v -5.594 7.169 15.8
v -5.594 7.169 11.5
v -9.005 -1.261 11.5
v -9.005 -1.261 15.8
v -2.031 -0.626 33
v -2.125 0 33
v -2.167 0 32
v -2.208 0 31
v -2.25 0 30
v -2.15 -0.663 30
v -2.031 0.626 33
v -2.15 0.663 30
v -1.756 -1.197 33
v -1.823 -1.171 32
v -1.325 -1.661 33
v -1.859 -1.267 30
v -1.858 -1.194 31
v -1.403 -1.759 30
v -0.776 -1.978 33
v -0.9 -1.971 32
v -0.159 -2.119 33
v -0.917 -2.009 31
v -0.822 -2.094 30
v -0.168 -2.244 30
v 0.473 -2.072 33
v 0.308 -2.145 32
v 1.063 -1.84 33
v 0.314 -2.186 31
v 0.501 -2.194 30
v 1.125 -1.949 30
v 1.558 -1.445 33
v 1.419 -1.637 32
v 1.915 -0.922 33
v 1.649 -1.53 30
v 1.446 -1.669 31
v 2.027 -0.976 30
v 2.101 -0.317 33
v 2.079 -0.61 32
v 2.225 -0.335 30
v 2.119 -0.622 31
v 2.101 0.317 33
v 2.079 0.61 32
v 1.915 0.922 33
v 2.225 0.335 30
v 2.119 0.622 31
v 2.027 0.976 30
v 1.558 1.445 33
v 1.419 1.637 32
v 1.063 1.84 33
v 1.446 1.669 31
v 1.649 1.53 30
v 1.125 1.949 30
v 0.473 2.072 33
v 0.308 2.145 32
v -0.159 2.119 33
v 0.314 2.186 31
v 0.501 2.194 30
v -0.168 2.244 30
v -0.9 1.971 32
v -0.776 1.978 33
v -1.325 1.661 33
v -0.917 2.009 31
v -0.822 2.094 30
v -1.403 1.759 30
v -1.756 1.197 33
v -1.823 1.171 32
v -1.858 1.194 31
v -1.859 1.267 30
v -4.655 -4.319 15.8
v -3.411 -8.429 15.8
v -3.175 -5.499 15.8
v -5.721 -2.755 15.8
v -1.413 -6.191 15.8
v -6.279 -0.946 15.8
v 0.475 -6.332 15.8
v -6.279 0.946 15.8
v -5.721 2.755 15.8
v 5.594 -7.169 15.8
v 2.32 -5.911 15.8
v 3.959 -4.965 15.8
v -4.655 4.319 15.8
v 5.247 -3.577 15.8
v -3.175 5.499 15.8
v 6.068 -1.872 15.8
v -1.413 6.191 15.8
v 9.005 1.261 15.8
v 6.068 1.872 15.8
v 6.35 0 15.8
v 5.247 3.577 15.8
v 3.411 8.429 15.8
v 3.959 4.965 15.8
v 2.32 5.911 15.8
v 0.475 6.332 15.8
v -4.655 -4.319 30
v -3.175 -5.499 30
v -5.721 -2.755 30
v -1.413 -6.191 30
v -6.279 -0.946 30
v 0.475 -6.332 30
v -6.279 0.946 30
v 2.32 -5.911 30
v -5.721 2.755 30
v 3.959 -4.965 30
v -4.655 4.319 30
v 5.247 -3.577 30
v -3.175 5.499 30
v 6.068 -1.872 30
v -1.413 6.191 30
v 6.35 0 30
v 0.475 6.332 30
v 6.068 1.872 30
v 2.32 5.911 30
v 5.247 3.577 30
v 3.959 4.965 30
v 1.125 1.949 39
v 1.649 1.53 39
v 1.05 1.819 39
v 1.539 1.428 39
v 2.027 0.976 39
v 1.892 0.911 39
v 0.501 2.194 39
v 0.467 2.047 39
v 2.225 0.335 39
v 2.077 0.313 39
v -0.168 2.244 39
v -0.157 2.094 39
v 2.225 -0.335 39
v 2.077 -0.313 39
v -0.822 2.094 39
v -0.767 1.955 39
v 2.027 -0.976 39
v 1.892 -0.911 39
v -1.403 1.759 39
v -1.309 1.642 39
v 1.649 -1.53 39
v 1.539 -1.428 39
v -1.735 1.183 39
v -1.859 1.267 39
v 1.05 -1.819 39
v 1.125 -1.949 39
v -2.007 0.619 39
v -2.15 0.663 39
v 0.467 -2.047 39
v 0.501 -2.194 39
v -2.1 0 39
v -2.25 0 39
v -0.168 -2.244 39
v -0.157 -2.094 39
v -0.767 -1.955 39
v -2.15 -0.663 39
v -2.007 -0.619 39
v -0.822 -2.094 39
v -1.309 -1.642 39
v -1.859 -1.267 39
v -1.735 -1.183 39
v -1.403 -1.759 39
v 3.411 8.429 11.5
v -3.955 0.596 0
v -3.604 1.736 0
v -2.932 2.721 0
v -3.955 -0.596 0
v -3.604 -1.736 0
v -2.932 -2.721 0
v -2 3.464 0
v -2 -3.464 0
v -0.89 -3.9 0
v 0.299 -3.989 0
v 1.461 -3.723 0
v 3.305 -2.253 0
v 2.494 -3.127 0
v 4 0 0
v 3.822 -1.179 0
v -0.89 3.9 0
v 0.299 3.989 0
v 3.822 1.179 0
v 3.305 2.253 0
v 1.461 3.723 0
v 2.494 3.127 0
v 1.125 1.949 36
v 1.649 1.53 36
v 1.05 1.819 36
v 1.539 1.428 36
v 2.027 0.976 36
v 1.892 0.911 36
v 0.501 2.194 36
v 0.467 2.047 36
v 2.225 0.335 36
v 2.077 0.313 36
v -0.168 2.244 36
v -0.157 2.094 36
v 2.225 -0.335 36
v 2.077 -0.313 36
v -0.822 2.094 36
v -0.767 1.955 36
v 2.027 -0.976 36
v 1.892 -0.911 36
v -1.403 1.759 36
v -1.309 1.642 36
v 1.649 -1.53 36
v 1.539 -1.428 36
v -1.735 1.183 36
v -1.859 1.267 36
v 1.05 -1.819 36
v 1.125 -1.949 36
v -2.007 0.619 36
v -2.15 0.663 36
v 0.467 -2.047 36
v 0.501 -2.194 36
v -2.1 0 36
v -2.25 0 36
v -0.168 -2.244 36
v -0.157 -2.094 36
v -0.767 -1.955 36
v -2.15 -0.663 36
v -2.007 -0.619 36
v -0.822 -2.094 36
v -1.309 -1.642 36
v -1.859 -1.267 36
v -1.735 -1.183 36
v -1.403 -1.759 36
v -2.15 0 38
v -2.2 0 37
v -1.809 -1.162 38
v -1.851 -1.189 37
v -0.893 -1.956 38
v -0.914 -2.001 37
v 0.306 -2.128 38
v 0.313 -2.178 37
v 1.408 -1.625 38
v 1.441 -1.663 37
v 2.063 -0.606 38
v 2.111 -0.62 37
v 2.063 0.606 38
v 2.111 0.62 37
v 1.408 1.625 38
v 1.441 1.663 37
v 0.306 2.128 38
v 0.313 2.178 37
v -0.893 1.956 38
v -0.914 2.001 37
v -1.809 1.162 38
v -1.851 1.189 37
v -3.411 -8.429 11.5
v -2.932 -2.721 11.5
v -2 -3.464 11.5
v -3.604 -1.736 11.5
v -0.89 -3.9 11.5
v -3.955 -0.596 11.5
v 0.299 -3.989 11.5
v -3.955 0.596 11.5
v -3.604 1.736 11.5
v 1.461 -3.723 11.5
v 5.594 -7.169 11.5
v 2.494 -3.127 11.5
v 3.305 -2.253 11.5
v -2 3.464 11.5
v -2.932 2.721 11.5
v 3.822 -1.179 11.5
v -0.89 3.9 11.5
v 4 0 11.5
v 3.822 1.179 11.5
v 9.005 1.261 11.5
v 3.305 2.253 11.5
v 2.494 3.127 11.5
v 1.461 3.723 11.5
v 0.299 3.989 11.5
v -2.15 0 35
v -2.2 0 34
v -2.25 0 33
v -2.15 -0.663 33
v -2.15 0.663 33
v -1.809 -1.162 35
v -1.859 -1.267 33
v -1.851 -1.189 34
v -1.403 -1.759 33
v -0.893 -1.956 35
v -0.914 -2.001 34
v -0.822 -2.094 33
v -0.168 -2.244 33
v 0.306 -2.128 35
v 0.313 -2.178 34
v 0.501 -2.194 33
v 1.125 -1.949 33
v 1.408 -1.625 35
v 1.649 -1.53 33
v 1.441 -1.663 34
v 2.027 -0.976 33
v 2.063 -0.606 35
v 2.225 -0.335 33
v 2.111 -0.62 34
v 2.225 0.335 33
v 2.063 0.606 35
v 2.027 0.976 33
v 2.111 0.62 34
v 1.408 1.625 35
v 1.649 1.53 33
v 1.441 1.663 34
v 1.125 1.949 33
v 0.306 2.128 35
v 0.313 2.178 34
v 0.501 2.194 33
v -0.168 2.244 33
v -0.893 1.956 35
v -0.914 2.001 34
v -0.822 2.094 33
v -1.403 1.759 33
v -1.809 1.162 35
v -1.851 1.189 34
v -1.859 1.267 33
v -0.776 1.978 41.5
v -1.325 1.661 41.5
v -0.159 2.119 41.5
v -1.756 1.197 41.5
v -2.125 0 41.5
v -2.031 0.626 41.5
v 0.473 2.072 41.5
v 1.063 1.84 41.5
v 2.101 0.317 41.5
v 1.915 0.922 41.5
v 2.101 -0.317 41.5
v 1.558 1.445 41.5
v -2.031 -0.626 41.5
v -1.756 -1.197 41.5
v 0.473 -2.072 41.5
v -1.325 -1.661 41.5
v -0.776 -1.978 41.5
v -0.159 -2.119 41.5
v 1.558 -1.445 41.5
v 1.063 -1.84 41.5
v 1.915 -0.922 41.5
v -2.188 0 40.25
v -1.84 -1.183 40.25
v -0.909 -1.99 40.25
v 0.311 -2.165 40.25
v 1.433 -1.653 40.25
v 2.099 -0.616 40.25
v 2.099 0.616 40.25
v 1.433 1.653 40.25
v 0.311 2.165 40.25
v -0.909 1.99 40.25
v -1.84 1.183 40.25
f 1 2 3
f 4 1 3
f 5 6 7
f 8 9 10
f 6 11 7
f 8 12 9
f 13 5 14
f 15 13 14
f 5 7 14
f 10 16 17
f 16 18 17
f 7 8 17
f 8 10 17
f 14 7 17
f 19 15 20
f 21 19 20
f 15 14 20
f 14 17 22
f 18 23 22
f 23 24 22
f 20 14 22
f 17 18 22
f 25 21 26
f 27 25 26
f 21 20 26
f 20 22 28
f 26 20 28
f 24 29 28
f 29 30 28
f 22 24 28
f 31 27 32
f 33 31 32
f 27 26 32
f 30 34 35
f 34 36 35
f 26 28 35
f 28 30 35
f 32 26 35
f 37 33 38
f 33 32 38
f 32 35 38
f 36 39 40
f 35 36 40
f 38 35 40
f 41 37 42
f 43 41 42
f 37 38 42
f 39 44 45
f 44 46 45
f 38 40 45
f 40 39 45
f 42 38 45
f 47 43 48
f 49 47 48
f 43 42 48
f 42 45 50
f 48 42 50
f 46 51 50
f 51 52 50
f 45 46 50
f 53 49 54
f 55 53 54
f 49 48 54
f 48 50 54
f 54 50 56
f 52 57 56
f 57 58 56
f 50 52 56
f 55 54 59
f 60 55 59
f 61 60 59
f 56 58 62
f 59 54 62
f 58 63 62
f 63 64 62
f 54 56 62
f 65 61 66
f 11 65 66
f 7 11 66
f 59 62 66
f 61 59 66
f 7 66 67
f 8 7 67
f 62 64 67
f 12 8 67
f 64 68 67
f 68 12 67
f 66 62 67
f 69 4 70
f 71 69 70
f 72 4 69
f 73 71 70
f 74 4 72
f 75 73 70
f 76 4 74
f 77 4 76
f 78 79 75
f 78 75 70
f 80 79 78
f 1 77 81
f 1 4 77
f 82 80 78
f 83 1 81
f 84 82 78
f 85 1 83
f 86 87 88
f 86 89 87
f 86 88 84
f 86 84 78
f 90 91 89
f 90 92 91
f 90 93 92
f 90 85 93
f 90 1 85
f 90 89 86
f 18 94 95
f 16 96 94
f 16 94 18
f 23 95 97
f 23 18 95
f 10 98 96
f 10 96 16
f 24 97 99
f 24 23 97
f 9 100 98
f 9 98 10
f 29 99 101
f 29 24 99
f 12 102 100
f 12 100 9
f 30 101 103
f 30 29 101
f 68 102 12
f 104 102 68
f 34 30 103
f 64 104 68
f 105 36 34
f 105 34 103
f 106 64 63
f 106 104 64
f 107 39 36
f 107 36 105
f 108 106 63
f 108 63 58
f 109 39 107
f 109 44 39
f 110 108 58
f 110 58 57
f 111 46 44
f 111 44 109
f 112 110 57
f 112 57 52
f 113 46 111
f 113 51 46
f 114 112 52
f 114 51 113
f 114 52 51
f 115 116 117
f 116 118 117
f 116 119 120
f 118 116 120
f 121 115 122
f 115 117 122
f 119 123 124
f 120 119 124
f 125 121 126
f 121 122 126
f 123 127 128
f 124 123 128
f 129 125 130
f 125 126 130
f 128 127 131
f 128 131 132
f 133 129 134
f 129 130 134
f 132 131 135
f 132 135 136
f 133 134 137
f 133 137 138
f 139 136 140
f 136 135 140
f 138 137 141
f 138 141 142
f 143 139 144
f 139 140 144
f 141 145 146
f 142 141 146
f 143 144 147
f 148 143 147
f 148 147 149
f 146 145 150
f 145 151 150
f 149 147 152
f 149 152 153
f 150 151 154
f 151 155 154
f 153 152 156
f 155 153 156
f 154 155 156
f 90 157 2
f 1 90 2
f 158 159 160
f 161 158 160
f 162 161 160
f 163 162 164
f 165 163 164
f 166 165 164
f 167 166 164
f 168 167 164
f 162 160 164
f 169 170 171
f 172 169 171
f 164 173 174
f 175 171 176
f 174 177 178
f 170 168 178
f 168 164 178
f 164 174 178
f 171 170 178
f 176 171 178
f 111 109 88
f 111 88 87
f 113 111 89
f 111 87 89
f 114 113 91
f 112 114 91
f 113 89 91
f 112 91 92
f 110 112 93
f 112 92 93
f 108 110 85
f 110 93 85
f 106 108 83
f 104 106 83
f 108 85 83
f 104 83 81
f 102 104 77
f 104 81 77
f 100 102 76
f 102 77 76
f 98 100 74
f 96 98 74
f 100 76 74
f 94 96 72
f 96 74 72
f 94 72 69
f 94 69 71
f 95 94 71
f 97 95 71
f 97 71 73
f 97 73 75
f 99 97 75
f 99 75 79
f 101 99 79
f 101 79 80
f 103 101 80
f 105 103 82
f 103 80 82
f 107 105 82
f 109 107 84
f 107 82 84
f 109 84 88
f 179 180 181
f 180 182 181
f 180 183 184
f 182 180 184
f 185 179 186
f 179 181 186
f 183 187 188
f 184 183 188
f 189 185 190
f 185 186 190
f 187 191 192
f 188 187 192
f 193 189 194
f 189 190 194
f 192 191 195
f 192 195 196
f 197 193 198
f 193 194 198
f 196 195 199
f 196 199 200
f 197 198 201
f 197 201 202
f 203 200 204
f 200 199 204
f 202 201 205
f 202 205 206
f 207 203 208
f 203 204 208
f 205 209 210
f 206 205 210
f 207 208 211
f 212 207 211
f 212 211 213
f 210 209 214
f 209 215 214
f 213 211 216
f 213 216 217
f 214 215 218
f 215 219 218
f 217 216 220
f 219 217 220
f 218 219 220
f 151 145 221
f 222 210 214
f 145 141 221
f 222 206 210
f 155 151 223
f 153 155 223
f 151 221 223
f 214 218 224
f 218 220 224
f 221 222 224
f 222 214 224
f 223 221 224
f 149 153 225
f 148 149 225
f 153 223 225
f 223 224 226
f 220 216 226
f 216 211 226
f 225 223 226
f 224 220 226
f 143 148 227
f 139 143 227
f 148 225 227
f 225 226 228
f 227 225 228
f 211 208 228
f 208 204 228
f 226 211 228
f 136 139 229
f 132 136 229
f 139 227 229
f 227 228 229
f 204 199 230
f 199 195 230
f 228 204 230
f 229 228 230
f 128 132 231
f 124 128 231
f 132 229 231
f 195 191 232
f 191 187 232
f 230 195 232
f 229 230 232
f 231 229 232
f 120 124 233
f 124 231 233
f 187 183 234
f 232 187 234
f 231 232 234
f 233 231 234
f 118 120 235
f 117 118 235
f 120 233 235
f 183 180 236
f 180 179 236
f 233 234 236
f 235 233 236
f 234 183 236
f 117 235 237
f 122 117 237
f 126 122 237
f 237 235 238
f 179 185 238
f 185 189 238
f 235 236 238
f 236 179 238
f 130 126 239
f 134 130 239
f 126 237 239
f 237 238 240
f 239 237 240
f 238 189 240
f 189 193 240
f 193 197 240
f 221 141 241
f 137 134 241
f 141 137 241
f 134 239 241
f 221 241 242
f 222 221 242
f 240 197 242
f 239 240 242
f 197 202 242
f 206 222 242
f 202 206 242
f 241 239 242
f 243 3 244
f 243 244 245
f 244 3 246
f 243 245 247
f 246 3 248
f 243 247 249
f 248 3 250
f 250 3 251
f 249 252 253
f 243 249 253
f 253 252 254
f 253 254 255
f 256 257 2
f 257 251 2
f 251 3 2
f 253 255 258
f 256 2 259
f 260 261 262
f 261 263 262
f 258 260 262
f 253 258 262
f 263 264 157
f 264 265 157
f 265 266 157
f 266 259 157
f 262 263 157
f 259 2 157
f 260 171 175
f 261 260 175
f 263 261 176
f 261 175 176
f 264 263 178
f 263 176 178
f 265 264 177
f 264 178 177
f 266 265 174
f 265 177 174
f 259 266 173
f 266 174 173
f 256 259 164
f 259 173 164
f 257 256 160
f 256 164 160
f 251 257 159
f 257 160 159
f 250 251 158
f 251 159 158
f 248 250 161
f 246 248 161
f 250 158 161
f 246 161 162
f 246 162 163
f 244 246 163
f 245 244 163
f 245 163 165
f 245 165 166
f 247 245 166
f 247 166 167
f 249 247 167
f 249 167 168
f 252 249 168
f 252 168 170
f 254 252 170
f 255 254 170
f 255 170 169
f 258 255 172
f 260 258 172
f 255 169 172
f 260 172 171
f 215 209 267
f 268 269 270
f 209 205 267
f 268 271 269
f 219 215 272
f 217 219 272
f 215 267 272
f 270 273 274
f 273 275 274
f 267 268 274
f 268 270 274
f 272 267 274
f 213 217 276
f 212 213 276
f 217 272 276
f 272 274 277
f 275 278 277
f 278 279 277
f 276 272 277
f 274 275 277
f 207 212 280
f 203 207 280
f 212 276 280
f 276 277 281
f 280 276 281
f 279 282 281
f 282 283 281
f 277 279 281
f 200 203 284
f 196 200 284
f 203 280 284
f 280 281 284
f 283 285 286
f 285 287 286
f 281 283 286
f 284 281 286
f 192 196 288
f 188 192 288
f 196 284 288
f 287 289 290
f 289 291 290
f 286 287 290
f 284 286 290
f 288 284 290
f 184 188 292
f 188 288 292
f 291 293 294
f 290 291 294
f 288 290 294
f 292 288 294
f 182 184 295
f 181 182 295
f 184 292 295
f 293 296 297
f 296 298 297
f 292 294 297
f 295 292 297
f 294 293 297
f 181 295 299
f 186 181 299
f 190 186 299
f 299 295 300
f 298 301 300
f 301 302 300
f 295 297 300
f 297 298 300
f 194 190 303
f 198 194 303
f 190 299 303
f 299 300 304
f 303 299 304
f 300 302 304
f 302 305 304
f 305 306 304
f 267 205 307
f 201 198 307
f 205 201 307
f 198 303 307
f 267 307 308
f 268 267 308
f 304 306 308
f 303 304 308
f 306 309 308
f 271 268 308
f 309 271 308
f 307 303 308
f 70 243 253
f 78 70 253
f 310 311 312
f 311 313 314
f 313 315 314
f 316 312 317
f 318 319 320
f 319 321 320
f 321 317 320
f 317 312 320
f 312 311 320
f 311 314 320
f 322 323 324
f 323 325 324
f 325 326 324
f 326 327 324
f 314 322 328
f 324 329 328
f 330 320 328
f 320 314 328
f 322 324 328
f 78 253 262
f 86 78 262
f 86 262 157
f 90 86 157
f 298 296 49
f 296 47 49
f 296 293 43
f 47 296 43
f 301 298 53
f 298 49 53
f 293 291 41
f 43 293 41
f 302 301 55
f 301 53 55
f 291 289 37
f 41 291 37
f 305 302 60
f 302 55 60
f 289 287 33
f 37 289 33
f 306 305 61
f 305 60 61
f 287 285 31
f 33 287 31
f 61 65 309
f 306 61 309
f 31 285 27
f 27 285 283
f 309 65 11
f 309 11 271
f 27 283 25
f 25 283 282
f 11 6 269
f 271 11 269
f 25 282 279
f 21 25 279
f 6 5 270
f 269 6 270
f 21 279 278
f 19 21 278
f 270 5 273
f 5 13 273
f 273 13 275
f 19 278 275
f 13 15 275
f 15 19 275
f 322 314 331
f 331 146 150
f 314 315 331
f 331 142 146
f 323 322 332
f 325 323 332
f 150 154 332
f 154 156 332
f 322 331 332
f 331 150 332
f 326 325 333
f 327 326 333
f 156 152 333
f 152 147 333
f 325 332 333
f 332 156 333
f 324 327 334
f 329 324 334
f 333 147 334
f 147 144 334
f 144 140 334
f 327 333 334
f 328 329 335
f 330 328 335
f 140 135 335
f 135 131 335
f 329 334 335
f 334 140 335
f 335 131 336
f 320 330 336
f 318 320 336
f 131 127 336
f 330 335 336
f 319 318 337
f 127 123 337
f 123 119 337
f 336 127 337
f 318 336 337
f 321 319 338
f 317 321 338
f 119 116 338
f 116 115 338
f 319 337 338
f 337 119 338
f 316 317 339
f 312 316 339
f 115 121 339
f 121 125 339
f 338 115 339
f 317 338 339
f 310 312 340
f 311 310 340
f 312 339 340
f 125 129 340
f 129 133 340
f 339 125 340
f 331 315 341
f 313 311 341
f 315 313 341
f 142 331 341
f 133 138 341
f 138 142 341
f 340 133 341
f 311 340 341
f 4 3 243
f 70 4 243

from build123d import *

# Parameters (mm, degrees)
ESQUISSE1_R      = 4
EXTRUSION1_DEPTH = 11.5
EXTRUSION2_DEPTH = 4.3
ESQUISSE3_R      = 6.35
EXTRUSION3_DEPTH = 14.2


with BuildPart() as part:
    # Esquisse1 → Extrusion1 (new body)
    with BuildSketch(Plane.XY):
        Circle(ESQUISSE1_R)
    extrude(amount=EXTRUSION1_DEPTH)

    # Esquisse2 → Extrusion2 (add)
    with BuildSketch(Plane.XY.offset(11.5)):
        Polygon((3.411005357, 8.429267018), (-5.594456694, 7.168650801), (-9.005462051, -1.260616217), (-3.411005357, -8.429267018), (5.594456694, -7.168650801), (9.005462051, 1.260616217), align=None)
    extrude(amount=EXTRUSION2_DEPTH)

    # Esquisse3 → Extrusion3 (add)
    with BuildSketch(Plane.XY.offset(15.8)):
        Circle(ESQUISSE3_R)
    extrude(amount=EXTRUSION3_DEPTH)

    # Esquisse4 → Révolution4 (revolve)
    with BuildSketch(Plane(origin=(0, 0, 0), x_dir=(1, 0, 0), z_dir=(0, 1, 0))):
        Polygon((0, -30), (0, -41.5), (-2.125, -41.5), (-2.25, -39), (-2.1, -39), (-2.25, -36), (-2.1, -36), (-2.25, -33), (-2.125, -33), (-2.25, -30), align=None)
    revolve(axis=Axis((0, 0, 18.076774383), (0, 0, 1)))


solid = part.part
